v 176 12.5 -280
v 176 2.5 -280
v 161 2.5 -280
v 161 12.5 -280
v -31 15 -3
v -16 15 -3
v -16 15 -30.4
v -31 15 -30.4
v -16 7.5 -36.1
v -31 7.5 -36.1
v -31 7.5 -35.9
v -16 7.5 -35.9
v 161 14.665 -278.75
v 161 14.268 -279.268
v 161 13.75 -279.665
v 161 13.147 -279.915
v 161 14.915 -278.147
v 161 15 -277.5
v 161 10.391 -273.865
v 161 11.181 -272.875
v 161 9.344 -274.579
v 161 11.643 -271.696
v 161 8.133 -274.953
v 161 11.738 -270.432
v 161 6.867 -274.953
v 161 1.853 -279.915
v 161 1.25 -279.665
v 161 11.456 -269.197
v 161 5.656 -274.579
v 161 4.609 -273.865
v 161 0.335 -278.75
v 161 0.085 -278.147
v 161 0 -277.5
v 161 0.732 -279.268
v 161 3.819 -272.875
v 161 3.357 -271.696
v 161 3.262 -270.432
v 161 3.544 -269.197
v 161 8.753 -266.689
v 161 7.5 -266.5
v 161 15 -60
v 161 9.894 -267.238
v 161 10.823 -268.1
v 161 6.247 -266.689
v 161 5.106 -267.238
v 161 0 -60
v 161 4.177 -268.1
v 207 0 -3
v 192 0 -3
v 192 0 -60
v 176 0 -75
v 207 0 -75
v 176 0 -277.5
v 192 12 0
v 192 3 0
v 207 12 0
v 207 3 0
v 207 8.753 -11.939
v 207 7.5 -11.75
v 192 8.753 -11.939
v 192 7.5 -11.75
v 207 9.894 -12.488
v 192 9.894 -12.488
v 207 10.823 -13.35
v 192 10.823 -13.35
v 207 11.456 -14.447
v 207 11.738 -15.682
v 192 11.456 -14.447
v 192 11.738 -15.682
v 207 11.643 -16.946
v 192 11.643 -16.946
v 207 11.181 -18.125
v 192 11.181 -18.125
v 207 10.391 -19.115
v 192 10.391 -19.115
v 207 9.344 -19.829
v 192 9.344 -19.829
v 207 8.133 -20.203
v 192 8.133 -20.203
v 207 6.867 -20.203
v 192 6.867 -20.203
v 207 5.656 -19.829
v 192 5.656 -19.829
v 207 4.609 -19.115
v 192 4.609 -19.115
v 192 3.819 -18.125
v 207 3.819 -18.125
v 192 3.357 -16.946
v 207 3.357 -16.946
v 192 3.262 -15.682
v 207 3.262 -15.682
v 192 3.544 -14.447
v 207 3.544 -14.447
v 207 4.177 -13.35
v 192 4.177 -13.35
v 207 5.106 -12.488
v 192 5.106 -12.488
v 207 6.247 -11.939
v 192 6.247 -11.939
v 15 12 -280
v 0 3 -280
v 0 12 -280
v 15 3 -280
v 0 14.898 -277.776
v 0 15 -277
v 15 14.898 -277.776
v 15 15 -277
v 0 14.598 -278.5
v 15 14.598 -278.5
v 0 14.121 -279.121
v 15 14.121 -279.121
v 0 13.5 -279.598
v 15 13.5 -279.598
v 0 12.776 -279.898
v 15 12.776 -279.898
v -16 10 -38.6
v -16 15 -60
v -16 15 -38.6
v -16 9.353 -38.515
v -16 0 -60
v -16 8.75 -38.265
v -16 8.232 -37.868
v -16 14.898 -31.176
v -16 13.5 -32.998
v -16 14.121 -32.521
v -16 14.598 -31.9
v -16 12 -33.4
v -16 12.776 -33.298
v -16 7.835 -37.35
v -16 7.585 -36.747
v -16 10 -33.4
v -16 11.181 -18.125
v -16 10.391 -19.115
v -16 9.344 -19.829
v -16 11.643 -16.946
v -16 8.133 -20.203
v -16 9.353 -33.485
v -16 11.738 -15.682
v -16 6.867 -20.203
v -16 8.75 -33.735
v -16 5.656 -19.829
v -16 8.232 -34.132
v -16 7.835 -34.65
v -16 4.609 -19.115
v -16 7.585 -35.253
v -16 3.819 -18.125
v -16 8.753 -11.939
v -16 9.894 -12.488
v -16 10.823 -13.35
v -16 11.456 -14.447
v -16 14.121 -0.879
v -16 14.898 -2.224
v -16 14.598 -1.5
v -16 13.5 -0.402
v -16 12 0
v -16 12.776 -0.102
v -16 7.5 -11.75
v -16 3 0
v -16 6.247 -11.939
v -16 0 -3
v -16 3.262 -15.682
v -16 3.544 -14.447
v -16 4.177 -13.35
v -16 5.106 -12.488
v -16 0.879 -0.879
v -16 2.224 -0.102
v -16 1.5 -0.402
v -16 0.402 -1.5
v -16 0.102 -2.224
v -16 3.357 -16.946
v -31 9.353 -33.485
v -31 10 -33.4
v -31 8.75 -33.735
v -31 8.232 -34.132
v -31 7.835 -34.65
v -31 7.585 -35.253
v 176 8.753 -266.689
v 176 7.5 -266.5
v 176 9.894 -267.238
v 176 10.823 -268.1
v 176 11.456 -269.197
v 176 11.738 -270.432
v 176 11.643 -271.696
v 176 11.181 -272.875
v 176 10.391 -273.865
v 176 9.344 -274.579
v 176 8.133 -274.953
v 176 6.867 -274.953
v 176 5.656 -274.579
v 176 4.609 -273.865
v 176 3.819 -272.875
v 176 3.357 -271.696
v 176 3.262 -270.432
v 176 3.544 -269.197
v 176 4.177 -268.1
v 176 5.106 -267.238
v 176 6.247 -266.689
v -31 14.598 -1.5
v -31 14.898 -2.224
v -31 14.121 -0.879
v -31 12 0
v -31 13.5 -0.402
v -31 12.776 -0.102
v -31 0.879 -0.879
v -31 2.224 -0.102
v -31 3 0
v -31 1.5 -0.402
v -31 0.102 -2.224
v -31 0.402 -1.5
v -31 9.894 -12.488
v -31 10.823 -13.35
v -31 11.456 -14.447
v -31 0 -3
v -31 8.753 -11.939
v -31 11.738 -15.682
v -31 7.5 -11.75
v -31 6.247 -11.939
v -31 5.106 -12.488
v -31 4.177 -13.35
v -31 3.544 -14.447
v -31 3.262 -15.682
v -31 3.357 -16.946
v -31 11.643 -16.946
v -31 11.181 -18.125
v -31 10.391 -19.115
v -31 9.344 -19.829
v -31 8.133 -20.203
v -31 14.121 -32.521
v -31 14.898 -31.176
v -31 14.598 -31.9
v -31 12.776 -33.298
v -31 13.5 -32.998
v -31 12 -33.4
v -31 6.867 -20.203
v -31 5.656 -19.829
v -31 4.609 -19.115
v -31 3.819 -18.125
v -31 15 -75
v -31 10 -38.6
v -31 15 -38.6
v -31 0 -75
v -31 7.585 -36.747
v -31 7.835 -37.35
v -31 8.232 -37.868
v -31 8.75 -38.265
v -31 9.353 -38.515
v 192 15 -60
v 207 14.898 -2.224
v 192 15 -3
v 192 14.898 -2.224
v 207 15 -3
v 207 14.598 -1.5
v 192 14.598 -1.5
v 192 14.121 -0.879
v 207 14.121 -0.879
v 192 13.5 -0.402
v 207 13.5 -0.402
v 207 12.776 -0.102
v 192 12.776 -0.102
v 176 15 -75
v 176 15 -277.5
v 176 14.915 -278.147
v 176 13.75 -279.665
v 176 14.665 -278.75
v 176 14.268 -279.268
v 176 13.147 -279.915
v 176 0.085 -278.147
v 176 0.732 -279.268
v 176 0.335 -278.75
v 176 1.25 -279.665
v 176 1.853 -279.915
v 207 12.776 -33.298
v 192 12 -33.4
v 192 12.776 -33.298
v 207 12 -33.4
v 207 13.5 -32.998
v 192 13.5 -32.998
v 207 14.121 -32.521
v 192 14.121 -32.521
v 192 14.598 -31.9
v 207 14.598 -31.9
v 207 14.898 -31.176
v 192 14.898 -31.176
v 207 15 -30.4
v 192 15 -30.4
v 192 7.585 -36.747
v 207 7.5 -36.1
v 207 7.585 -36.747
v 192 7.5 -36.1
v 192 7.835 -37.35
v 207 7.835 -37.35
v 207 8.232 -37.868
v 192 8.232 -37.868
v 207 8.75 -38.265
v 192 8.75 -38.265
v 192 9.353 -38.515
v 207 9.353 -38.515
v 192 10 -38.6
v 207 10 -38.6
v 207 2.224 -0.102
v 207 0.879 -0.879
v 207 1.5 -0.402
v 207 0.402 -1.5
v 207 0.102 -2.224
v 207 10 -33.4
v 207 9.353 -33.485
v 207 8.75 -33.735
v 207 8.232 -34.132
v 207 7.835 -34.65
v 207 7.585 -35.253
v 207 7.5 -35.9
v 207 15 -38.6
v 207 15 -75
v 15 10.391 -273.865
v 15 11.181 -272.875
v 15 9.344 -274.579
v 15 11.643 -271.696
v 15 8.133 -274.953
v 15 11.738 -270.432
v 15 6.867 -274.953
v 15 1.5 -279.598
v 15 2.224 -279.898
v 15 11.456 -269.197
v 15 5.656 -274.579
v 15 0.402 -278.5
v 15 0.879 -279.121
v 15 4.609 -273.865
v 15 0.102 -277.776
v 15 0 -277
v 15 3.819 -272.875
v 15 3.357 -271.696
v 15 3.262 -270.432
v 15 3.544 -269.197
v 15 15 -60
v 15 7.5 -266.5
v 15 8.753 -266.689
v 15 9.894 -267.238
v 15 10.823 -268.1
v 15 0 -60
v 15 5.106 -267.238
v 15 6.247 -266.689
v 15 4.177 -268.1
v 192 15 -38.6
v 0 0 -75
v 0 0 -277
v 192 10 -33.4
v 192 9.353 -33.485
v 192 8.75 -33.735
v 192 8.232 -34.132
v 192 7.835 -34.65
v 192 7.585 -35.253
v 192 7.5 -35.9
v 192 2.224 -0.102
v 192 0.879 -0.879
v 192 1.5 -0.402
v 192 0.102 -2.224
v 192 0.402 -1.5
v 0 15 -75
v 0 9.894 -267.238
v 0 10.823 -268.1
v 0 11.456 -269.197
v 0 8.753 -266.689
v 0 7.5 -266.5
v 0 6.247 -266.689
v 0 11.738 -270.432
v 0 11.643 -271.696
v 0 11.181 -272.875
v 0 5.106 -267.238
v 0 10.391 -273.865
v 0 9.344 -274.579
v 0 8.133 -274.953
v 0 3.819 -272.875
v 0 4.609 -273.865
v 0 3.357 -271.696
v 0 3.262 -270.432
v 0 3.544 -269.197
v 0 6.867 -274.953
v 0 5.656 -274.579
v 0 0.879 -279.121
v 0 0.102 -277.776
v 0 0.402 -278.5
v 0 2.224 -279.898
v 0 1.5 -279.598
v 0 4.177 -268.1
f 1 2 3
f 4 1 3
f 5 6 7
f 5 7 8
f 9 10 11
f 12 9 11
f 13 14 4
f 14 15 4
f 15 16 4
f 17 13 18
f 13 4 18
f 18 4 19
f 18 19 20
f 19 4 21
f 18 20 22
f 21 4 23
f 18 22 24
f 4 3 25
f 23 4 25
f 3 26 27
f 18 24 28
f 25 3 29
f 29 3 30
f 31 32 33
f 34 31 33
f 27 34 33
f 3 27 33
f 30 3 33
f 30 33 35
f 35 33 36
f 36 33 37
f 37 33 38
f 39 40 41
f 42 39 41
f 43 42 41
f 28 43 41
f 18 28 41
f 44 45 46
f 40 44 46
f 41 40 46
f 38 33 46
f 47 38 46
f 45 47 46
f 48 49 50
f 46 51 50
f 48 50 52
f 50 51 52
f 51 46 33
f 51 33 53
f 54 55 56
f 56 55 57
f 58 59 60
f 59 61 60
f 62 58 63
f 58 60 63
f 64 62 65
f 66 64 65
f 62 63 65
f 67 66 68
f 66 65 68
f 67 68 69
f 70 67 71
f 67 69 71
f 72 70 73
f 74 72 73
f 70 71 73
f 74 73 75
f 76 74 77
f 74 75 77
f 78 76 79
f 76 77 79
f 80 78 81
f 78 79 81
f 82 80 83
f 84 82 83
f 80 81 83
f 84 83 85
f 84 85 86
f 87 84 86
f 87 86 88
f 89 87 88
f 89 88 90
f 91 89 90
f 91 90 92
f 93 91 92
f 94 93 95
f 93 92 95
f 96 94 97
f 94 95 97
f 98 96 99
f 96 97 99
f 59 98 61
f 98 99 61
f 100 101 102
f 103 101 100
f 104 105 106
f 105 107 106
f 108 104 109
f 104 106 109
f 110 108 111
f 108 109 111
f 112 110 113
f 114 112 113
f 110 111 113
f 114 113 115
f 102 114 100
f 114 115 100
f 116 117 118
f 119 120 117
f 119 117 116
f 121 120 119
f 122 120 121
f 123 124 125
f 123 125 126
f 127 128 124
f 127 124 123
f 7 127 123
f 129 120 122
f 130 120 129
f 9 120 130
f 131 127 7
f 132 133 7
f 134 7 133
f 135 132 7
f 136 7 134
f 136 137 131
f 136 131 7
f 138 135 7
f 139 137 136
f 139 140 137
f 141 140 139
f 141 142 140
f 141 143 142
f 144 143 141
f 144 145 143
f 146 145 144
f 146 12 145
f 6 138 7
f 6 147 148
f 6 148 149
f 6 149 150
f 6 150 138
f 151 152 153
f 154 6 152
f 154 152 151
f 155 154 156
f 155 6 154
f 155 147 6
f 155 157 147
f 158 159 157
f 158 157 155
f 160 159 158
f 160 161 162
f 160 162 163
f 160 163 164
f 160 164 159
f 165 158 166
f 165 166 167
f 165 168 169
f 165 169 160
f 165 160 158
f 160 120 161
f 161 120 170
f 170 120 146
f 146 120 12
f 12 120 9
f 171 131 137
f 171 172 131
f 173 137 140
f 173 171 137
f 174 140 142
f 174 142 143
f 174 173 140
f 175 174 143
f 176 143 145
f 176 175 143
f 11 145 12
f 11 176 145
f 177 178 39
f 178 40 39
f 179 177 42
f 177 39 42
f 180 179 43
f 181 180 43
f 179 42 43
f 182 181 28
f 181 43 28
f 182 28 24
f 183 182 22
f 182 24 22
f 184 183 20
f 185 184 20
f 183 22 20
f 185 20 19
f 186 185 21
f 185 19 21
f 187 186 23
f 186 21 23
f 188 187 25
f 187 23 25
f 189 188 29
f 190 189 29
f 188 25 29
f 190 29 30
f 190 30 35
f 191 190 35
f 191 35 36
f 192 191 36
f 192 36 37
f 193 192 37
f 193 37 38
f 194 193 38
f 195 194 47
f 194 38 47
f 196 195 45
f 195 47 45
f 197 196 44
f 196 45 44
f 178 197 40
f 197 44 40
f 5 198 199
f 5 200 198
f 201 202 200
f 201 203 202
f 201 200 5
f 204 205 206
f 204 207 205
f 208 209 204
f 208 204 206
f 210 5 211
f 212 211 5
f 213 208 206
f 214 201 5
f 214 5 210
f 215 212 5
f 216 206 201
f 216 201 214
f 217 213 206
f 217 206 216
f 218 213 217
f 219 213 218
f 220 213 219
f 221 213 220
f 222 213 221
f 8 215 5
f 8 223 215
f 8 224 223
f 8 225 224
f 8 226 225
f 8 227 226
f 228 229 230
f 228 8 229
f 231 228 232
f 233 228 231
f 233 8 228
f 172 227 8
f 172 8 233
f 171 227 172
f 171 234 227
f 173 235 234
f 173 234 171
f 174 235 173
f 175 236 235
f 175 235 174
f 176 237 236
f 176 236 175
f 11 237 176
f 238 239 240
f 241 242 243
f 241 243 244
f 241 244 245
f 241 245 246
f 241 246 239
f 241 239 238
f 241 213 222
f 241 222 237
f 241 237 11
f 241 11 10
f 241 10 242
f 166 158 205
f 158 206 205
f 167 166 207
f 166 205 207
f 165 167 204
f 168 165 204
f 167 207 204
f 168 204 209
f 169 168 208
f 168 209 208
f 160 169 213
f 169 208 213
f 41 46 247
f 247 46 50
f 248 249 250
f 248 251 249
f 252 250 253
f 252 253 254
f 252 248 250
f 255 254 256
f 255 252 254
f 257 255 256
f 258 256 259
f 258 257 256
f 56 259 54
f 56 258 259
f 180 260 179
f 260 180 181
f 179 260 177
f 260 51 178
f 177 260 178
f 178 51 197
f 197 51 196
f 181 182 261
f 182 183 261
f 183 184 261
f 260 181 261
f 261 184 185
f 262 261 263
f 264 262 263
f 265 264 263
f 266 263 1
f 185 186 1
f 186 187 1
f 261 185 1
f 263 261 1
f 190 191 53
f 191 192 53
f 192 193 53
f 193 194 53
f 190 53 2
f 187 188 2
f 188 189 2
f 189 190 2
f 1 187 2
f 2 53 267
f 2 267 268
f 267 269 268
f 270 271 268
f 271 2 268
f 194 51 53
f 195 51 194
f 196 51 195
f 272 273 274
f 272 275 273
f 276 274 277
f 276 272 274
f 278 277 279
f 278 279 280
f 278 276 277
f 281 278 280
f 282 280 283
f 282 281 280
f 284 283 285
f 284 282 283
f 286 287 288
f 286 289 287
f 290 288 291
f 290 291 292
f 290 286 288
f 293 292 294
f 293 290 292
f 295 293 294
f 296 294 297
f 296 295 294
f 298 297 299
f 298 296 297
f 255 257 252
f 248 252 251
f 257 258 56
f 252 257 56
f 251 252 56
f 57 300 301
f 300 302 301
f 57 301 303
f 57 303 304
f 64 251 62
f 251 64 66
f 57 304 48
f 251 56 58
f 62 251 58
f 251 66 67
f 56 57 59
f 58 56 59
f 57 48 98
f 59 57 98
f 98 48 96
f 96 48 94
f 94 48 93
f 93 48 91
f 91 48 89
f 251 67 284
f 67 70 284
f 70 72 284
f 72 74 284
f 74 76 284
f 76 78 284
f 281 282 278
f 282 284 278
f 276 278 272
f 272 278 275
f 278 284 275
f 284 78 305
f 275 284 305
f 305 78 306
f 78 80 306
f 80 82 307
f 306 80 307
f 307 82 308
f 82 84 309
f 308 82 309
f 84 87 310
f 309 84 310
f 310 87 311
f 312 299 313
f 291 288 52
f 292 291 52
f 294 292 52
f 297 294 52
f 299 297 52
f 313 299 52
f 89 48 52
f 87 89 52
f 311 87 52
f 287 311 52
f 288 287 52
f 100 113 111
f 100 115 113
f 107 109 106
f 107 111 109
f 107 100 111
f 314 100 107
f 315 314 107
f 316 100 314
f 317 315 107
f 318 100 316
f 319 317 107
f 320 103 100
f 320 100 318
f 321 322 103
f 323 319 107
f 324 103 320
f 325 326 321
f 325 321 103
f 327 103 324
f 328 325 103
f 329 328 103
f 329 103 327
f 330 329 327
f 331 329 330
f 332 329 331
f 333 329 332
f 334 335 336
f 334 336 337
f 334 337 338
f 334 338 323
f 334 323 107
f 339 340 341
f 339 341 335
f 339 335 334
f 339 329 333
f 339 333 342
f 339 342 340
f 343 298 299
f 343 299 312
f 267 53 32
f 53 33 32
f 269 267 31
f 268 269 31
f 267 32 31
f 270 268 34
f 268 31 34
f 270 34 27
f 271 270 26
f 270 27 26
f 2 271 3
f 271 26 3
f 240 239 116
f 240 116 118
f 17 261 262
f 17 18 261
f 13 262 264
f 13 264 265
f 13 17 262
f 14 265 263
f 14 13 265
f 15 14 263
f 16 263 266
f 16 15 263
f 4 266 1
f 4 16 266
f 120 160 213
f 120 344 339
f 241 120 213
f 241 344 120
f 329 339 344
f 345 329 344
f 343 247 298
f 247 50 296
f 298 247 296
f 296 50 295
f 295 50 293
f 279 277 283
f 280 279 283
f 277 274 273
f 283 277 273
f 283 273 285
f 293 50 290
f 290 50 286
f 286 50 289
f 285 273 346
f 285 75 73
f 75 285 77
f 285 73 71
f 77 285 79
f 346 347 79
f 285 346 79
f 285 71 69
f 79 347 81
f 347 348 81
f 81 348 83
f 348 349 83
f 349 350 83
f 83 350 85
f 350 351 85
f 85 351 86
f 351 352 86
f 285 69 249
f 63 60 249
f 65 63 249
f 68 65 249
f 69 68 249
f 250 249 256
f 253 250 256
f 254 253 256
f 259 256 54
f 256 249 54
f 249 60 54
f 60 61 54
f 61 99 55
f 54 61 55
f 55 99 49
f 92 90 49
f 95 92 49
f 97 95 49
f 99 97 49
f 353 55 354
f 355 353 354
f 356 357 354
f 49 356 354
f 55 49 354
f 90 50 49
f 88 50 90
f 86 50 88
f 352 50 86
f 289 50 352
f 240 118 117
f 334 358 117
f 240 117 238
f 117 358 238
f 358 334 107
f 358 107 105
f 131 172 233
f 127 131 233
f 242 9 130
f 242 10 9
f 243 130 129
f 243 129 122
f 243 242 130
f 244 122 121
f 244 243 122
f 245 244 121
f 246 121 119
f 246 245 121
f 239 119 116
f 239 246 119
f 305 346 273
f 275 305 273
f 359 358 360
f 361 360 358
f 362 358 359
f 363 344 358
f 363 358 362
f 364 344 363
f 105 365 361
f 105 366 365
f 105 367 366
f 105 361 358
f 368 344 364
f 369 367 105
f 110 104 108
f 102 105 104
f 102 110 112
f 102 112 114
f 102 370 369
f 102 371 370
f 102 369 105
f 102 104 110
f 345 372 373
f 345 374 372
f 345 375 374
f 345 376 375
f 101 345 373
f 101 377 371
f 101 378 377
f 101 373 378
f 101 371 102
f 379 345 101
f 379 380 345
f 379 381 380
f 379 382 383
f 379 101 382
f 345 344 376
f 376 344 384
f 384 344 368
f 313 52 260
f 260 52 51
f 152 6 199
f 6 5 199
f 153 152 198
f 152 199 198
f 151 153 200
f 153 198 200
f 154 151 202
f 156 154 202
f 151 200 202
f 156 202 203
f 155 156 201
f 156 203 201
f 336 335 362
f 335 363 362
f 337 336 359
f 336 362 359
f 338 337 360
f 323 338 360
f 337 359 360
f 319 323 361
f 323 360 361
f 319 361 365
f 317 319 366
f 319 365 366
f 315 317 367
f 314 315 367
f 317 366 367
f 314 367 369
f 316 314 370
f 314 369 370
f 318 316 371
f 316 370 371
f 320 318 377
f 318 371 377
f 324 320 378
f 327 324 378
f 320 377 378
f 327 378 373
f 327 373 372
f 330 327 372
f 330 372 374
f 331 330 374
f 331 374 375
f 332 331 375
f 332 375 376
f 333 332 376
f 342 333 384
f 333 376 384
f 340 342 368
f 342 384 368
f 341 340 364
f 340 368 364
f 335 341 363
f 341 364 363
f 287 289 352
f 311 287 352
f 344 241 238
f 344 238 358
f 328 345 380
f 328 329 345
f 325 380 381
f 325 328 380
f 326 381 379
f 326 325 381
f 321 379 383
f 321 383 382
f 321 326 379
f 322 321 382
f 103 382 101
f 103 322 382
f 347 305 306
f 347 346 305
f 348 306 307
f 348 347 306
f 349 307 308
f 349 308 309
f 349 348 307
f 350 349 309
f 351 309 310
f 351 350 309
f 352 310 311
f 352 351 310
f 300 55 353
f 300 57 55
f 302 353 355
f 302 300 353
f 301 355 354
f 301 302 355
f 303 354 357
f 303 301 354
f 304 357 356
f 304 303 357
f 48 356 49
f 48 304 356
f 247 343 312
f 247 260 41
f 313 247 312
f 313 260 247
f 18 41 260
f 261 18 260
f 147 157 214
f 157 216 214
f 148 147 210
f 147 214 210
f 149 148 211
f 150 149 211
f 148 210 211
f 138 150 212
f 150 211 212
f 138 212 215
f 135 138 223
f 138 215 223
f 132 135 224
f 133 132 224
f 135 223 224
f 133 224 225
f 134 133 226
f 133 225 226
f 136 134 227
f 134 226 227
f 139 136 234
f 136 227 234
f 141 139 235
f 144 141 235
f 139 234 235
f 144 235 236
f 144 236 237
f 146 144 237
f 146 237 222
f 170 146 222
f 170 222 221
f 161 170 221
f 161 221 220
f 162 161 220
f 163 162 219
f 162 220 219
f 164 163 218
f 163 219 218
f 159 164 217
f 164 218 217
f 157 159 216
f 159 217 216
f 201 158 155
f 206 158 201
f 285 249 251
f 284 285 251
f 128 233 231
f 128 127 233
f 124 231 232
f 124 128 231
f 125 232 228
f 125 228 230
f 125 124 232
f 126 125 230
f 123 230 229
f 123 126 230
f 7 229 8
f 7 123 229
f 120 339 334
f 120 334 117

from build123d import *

# Parameters (mm, degrees)
OUTER_LEGS_DEPTH            = 15
OUTER_LEGS_2_DEPTH          = 15
SKETCH7_R                   = 4.25
LOWER_DOWEL_HOLE_DEPTH      = 224
LOWER_DOWEL_HOLE_DEPTH_BACK = 16
SKETCH8_W                   = 5.2
SKETCH8_H                   = 7.5
CUT_EXTRUDE4_DEPTH          = 32
CUT_EXTRUDE4_DEPTH_BACK     = 208
SKETCH6_R                   = 4.25
HINGE_HOLE_DEPTH            = 32
HINGE_HOLE_DEPTH_BACK       = 208
FILLET3_R                   = 2.5
FILLET5_R                   = 3
FILLET6_R                   = 3
FILLET10_R                  = 3
FILLET11_R                  = 3
FILLET12_R                  = 2.5
FILLET13_R                  = 2.5
FILLET14_R                  = 3


with BuildPart() as part:
    # Sketch2 → outer legs (new body)
    with BuildSketch(Plane(origin=(0, 0, 0), x_dir=(1, 0, 0), z_dir=(0, 1, 0))):
        Polygon((0, 75), (0, 280), (15, 280), (15, 60), (-16, 60), (-16, 0), (-31, 0), (-31, 75), align=None)
    extrude(amount=OUTER_LEGS_DEPTH)


with BuildPart() as body_2:
    # Sketch2 → outer legs 2 (new body)
    with BuildSketch(Plane(origin=(0, 0, 0), x_dir=(1, 0, 0), z_dir=(0, 1, 0))):
        Polygon((176, 75), (176, 280), (161, 280), (161, 60), (192, 60), (192, 0), (207, 0), (207, 75), align=None)
    extrude(amount=OUTER_LEGS_2_DEPTH)


with BuildPart() as lower_dowel_hole_tool:
    # Sketch7 → LOWER DOWEL HOLE (new body, two sides)
    with BuildSketch(Plane.ZY.offset(-192)) as lower_dowel_hole_sk:
        with Locations((-16, 7.5)):
            Circle(SKETCH7_R)
    extrude(amount=LOWER_DOWEL_HOLE_DEPTH)
    extrude(lower_dowel_hole_sk.sketch, amount=-LOWER_DOWEL_HOLE_DEPTH_BACK)


with BuildPart() as part_1:
    add(part.part)

    # LOWER DOWEL HOLE: cut by lower_dowel_hole_tool
    add(lower_dowel_hole_tool.part, mode=Mode.SUBTRACT)


with BuildPart() as body_2_1:
    add(body_2.part)

    # LOWER DOWEL HOLE: cut by lower_dowel_hole_tool
    add(lower_dowel_hole_tool.part, mode=Mode.SUBTRACT)


with BuildPart() as cut_extrude4_tool:
    # Sketch8 → Cut-Extrude4 (new body, two sides)
    with BuildSketch(Plane.ZY) as cut_extrude4_sk:
        with Locations((-36, 11.25)):
            Rectangle(SKETCH8_W, SKETCH8_H)
    extrude(amount=CUT_EXTRUDE4_DEPTH)
    extrude(cut_extrude4_sk.sketch, amount=-CUT_EXTRUDE4_DEPTH_BACK)


with BuildPart() as part_2:
    add(part_1.part)

    # Cut-Extrude4: cut by cut_extrude4_tool
    add(cut_extrude4_tool.part, mode=Mode.SUBTRACT)


with BuildPart() as body_2_2:
    add(body_2_1.part)

    # Cut-Extrude4: cut by cut_extrude4_tool
    add(cut_extrude4_tool.part, mode=Mode.SUBTRACT)


with BuildPart() as hinge_hole_tool:
    # Sketch6 → HINGE HOLE (new body, two sides)
    with BuildSketch(Plane.ZY) as hinge_hole_sk:
        with Locations((-270.75, 7.5)):
            Circle(SKETCH6_R)
    extrude(amount=HINGE_HOLE_DEPTH)
    extrude(hinge_hole_sk.sketch, amount=-HINGE_HOLE_DEPTH_BACK)


with BuildPart() as part_3:
    add(part_2.part)

    # HINGE HOLE: cut by hinge_hole_tool
    add(hinge_hole_tool.part, mode=Mode.SUBTRACT)

    # Fillet5
    fillet5_edges = [part_3.edges().sort_by_distance(p)[0] for p in [
        (-23.5, 15, -33.4),
    ]]
    fillet(fillet5_edges, radius=FILLET5_R)

    # Fillet10
    fillet10_edges = [part_3.edges().sort_by_distance(p)[0] for p in [
        (-23.5, 15, 0),
        (-23.5, 0, 0),
    ]]
    fillet(fillet10_edges, radius=FILLET10_R)

    # Fillet12
    fillet12_edges = [part_3.edges().sort_by_distance(p)[0] for p in [
        (-23.5, 7.5, -38.6),
        (-23.5, 7.5, -33.4),
    ]]
    fillet(fillet12_edges, radius=FILLET12_R)

    # Fillet14
    fillet14_edges = [part_3.edges().sort_by_distance(p)[0] for p in [
        (7.5, 0, -280),
        (7.5, 15, -280),
    ]]
    fillet(fillet14_edges, radius=FILLET14_R)


with BuildPart() as body_2_3:
    add(body_2_2.part)

    # HINGE HOLE: cut by hinge_hole_tool
    add(hinge_hole_tool.part, mode=Mode.SUBTRACT)

    # Fillet3
    fillet3_edges = [body_2_3.edges().sort_by_distance(p)[0] for p in [
        (168.5, 0, -280),
        (168.5, 15, -280),
    ]]
    fillet(fillet3_edges, radius=FILLET3_R)

    # Fillet6
    fillet6_edges = [body_2_3.edges().sort_by_distance(p)[0] for p in [
        (199.5, 15, -33.4),
    ]]
    fillet(fillet6_edges, radius=FILLET6_R)

    # Fillet11
    fillet11_edges = [body_2_3.edges().sort_by_distance(p)[0] for p in [
        (199.5, 0, 0),
        (199.5, 15, 0),
    ]]
    fillet(fillet11_edges, radius=FILLET11_R)

    # Fillet13
    fillet13_edges = [body_2_3.edges().sort_by_distance(p)[0] for p in [
        (199.5, 7.5, -33.4),
        (199.5, 7.5, -38.6),
    ]]
    fillet(fillet13_edges, radius=FILLET13_R)


solid = Compound([part_3.part, body_2_3.part])
